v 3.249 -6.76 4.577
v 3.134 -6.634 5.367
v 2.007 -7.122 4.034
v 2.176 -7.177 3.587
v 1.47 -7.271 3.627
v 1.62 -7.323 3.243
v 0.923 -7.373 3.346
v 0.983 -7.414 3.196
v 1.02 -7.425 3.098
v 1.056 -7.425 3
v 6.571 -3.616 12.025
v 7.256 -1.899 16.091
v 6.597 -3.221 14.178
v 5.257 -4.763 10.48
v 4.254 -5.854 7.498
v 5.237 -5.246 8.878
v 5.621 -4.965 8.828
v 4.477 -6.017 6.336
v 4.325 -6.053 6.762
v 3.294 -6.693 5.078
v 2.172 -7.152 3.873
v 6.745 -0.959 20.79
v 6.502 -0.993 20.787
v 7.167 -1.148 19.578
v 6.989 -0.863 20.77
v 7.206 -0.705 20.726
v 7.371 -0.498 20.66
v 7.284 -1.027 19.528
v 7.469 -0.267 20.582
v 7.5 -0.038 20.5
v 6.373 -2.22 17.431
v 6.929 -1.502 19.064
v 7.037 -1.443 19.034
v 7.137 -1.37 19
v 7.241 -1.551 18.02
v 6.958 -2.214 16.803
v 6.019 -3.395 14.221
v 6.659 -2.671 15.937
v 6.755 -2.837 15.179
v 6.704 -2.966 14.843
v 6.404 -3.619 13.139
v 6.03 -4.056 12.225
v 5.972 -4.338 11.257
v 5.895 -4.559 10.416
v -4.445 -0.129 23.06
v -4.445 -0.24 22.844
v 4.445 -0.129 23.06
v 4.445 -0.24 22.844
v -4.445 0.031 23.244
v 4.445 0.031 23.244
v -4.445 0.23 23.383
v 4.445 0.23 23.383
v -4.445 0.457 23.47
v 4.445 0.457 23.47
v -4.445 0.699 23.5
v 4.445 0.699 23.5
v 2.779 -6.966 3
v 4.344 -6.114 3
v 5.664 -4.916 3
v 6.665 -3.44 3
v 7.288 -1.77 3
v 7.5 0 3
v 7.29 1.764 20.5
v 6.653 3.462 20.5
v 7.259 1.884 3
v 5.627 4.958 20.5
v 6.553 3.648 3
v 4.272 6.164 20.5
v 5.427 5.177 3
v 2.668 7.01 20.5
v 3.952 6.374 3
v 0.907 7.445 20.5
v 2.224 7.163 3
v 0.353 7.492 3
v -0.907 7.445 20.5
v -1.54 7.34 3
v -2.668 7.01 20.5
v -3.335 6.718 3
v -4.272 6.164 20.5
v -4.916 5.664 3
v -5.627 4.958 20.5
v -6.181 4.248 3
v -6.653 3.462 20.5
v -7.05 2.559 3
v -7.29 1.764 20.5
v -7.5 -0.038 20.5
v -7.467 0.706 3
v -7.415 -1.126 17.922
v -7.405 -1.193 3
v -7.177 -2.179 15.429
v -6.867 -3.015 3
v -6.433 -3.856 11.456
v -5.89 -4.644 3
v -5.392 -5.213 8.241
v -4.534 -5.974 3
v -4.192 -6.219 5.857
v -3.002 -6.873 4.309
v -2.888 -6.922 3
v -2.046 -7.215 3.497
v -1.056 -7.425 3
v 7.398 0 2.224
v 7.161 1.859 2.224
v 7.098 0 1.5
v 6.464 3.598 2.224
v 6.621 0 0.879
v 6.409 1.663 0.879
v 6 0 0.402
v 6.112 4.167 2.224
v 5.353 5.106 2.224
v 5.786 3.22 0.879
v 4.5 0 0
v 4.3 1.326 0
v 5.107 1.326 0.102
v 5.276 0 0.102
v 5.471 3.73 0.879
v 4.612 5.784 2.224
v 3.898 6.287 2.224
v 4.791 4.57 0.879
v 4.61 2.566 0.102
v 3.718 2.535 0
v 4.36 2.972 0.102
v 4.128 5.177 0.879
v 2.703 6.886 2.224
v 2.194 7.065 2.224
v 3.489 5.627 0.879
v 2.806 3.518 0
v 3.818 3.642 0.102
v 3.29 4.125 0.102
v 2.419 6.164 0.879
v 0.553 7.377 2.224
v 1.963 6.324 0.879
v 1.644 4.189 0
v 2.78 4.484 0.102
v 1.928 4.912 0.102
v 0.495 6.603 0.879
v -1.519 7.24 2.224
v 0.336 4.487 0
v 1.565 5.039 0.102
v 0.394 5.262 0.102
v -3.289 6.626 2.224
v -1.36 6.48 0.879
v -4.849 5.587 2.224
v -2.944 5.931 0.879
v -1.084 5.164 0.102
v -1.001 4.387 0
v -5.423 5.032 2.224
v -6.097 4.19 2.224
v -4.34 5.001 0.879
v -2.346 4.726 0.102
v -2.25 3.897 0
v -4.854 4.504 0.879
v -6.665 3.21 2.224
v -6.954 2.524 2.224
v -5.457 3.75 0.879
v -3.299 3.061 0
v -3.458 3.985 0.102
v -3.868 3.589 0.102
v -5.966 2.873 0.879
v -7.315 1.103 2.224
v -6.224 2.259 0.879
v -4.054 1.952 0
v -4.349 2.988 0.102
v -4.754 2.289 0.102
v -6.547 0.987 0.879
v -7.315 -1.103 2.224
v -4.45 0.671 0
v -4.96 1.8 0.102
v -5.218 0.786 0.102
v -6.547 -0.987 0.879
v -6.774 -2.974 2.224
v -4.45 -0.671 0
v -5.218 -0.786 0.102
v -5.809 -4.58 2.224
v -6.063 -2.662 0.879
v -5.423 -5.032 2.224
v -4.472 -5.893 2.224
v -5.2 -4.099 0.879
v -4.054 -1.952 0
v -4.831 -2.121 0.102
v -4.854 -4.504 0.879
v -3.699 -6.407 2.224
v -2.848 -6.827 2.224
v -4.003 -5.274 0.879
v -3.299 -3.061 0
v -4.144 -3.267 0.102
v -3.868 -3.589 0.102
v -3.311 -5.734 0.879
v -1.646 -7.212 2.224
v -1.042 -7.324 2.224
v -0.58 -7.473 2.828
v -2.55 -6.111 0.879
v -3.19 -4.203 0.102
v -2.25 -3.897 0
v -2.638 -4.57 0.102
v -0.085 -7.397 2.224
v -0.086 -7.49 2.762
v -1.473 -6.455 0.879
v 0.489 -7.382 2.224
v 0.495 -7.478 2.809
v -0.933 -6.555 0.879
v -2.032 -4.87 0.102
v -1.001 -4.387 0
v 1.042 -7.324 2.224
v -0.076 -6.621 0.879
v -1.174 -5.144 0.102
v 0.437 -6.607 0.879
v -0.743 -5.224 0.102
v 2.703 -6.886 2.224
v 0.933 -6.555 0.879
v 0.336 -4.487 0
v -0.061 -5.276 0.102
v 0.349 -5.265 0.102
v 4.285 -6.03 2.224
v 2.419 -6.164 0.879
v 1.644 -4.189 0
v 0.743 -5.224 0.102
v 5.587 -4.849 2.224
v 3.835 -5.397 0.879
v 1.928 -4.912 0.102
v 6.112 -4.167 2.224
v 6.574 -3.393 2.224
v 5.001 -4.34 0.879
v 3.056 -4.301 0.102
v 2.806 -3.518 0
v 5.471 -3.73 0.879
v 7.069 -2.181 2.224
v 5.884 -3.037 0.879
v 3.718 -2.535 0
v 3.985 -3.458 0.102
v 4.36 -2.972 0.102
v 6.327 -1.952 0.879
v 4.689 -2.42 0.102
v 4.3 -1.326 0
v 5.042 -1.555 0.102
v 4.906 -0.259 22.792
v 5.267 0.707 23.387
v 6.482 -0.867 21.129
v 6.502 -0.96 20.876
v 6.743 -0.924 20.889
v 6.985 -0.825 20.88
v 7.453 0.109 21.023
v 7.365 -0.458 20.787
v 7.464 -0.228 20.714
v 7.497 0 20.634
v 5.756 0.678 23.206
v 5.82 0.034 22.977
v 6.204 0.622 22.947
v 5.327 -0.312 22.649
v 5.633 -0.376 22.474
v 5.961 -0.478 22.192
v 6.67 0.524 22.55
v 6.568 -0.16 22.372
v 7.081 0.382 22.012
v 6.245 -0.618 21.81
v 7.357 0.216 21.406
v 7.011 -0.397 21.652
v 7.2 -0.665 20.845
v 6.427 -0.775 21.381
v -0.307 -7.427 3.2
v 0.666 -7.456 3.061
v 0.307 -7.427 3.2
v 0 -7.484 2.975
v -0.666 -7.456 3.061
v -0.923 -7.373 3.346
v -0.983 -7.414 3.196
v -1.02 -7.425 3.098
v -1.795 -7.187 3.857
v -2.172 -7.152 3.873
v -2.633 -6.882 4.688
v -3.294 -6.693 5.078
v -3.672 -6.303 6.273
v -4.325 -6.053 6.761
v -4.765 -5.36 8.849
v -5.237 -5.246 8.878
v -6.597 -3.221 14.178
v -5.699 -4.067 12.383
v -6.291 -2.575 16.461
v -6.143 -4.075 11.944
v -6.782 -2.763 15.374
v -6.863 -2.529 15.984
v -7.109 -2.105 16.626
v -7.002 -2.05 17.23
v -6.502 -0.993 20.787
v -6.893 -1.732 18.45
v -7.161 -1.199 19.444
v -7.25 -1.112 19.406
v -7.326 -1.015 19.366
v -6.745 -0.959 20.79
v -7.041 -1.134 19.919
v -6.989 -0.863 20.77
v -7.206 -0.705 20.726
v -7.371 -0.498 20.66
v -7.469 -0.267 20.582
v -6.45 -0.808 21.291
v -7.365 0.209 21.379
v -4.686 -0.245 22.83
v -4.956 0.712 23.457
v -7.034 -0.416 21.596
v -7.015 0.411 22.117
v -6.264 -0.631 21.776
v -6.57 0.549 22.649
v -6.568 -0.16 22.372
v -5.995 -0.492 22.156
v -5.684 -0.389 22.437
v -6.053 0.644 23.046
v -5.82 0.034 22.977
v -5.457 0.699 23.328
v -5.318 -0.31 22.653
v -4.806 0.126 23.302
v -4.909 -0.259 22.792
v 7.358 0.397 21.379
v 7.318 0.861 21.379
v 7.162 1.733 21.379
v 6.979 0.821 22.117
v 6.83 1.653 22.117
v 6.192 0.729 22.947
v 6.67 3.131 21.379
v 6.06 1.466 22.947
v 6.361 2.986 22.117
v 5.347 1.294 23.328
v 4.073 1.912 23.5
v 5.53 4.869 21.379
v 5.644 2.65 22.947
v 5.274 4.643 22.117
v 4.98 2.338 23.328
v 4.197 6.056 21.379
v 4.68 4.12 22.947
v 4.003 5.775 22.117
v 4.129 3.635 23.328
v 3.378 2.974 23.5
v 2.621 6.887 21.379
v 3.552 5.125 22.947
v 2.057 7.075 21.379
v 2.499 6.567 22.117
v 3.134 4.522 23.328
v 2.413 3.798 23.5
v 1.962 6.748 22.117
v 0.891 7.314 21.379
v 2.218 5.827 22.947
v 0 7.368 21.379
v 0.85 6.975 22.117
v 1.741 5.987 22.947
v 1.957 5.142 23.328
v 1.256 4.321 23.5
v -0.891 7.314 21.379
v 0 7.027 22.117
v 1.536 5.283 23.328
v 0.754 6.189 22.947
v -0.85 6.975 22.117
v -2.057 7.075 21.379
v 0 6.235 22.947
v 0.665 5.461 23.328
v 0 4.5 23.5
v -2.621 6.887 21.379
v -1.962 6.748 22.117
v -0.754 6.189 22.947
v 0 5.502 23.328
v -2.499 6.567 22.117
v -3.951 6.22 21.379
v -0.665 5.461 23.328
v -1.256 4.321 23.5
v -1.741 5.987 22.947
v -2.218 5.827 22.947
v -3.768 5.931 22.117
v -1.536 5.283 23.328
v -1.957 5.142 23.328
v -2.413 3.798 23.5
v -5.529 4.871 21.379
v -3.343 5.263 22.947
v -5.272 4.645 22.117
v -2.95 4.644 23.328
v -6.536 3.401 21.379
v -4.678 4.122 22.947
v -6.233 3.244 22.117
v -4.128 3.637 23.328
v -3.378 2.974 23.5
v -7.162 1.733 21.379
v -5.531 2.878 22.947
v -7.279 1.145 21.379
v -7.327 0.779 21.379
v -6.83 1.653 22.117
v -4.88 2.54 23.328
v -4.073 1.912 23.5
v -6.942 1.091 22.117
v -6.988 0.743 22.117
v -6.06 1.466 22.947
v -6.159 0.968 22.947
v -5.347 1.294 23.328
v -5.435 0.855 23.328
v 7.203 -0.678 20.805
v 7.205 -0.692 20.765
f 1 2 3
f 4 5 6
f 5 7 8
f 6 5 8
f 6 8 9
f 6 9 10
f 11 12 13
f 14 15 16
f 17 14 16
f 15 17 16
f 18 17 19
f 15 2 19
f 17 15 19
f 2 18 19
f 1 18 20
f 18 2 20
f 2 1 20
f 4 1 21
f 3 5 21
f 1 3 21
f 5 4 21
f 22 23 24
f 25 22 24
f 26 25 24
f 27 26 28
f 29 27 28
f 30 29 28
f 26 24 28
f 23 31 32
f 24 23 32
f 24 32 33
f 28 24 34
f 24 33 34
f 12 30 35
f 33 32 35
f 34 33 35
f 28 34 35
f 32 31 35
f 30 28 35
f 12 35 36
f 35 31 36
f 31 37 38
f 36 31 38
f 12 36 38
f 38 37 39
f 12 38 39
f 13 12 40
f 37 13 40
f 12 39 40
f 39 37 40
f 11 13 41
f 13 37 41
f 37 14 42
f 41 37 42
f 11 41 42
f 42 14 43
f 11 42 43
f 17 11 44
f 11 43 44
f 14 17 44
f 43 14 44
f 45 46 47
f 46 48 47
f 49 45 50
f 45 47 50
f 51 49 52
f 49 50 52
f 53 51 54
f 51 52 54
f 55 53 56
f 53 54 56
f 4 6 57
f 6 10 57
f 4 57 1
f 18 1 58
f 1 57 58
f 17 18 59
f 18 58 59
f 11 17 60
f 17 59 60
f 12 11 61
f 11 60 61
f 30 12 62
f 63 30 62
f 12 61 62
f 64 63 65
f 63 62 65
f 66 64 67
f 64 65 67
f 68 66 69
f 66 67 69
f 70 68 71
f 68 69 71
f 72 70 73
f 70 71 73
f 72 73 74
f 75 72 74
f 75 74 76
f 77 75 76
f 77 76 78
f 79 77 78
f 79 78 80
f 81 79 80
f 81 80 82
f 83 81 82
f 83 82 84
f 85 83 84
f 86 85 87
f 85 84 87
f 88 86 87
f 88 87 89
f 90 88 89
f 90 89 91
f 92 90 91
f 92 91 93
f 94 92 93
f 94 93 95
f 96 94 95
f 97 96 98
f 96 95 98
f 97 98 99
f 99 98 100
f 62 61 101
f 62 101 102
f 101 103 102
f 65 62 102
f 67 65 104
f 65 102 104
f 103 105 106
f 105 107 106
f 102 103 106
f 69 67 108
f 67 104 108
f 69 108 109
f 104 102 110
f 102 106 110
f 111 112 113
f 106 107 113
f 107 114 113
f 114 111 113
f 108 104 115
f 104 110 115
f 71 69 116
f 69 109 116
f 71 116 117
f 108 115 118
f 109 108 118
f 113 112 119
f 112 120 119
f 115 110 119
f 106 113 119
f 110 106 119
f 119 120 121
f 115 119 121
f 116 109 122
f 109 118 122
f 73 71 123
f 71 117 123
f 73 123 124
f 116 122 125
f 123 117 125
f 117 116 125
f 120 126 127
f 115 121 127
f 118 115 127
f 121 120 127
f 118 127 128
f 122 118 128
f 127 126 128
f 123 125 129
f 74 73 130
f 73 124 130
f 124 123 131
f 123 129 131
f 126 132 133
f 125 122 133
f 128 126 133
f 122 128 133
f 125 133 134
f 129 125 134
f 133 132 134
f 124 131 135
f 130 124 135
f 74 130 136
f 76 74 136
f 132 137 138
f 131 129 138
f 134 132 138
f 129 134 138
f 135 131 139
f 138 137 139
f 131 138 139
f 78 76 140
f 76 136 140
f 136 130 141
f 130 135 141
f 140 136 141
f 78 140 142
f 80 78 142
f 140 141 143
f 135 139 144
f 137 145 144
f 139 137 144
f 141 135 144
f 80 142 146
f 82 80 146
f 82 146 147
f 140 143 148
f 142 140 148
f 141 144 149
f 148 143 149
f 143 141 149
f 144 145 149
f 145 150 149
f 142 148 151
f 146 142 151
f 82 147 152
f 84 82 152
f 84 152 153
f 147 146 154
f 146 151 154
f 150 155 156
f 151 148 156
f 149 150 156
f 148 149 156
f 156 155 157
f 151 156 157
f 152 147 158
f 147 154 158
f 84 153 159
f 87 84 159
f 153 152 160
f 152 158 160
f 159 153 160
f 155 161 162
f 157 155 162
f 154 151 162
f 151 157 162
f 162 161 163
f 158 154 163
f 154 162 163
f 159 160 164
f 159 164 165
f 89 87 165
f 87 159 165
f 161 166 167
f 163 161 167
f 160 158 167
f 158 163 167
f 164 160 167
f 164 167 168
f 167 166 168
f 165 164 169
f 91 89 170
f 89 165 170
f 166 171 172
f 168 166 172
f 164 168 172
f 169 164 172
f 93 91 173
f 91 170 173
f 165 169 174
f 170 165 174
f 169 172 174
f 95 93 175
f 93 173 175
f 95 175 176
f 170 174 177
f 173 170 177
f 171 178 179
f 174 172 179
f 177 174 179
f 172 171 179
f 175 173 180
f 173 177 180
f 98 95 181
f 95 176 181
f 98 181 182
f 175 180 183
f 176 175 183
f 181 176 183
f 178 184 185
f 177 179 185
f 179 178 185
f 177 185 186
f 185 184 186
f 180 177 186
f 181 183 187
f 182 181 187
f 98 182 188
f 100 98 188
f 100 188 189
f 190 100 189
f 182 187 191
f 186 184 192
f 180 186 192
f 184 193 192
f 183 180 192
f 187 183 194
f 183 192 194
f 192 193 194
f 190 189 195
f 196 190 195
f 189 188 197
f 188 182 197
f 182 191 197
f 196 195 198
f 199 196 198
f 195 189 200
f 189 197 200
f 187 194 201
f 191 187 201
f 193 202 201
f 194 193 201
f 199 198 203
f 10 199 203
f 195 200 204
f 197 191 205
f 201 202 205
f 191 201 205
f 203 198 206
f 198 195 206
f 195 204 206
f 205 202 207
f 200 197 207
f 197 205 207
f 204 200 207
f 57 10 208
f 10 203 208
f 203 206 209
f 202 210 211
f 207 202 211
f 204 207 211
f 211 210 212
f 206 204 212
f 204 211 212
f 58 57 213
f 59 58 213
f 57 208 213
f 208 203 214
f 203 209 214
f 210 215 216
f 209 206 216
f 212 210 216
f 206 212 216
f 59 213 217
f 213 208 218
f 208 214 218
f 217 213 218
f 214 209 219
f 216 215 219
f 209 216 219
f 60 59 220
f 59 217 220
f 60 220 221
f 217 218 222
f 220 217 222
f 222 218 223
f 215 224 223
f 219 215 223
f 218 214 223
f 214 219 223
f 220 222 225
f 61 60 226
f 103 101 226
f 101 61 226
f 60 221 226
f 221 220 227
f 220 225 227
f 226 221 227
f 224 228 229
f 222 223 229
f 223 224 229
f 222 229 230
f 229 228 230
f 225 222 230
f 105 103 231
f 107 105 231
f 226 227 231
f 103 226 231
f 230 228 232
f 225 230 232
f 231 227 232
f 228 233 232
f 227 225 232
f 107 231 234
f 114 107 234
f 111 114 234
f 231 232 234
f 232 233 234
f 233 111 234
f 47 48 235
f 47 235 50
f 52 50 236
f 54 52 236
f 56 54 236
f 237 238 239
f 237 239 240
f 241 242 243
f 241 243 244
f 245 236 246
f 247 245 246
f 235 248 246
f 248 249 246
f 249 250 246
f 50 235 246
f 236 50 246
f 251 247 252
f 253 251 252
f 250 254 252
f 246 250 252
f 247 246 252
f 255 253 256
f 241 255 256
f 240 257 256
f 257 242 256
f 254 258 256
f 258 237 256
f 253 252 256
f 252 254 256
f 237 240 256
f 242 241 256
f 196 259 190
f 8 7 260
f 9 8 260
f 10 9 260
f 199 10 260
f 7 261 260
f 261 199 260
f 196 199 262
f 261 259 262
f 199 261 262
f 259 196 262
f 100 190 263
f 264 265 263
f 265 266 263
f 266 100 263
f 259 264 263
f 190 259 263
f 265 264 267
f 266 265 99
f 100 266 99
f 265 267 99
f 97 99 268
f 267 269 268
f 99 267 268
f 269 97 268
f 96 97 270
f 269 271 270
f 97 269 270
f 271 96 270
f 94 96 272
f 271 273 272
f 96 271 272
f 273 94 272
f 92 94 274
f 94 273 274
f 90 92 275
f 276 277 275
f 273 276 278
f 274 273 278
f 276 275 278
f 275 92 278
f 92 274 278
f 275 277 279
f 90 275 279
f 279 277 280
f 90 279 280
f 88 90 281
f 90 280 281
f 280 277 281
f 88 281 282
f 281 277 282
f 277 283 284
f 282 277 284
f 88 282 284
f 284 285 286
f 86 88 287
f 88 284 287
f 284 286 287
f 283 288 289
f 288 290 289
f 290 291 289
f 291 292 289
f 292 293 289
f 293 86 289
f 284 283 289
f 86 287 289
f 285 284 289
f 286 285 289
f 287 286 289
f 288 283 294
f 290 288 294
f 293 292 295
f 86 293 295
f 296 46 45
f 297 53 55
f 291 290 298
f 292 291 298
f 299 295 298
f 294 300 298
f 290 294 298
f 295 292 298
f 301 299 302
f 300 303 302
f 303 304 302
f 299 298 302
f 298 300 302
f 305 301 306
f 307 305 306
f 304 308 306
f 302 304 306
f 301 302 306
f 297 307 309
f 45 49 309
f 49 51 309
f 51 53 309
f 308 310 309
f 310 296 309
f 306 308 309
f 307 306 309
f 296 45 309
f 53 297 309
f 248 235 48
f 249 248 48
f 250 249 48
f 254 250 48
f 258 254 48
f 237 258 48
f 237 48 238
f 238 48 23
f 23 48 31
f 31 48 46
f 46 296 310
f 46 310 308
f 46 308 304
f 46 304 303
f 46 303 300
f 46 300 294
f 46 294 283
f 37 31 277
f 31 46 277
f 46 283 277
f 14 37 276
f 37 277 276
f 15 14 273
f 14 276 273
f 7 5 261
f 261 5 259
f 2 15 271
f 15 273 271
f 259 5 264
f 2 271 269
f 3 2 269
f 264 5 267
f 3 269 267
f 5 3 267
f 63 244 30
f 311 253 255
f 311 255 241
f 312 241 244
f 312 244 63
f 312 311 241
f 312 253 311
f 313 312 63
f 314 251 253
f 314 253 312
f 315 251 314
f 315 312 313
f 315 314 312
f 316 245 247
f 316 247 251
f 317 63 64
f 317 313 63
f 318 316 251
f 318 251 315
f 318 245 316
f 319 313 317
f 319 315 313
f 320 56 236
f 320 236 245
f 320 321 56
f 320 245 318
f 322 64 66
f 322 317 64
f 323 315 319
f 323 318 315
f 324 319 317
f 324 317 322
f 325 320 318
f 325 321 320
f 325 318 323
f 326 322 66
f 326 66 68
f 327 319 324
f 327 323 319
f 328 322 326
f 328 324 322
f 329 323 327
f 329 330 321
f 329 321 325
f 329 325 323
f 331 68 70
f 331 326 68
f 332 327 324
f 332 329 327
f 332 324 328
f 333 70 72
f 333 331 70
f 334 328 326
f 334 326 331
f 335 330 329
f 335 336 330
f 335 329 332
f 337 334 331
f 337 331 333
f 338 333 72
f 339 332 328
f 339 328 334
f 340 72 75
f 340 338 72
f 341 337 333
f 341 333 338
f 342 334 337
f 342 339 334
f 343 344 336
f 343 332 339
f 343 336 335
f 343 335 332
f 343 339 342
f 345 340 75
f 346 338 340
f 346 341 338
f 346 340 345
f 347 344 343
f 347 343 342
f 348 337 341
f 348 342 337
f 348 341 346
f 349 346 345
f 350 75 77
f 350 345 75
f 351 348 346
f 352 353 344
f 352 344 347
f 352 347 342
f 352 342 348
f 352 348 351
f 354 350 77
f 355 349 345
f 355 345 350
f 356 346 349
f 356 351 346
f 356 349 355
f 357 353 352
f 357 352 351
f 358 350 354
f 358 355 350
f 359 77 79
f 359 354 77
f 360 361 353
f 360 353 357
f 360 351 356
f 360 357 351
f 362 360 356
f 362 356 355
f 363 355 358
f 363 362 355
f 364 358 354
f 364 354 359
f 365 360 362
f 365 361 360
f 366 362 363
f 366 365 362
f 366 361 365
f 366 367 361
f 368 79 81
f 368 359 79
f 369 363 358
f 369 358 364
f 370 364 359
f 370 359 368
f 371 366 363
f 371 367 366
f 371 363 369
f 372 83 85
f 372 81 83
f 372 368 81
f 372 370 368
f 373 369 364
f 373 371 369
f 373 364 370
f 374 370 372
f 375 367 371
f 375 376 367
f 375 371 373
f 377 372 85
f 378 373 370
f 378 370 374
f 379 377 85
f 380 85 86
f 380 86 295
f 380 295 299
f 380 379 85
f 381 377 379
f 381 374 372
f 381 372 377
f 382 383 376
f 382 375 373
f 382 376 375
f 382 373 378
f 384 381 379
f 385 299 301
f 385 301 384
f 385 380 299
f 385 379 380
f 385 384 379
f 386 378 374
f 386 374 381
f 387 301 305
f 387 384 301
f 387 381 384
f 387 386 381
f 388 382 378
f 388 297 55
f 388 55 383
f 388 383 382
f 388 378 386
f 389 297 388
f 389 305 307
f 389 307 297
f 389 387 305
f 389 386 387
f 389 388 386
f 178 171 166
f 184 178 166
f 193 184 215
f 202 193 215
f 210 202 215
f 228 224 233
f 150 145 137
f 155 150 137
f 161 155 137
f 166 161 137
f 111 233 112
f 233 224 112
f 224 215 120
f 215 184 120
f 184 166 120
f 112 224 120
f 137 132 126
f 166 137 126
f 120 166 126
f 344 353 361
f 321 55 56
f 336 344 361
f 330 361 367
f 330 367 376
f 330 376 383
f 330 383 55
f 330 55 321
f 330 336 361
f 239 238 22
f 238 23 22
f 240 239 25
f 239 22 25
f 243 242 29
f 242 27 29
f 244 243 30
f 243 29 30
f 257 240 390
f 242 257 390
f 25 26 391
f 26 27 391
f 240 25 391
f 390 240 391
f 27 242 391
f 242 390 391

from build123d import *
from build123d.topology import SkipClean

# Parameters (mm, degrees)
SKETCH2_R               = 7.5
BOSS_EXTRUDE1_DEPTH     = 23.5
FILLET1_R               = 3
CUT_EXTRUDE1_DEPTH      = 10
CUT_EXTRUDE1_DEPTH_BACK = 10
FILLET2_R               = 1


with BuildPart() as part:
    # Sketch2 → Boss-Extrude1 (new body)
    with BuildSketch(Plane.XY):
        Circle(SKETCH2_R)
    extrude(amount=BOSS_EXTRUDE1_DEPTH)

    # Fillet1
    fillet1_edges = [part.edges().sort_by_distance(p)[0] for p in [
        (-7.5, 0, 0),
        (-7.5, 0, 23.5),
    ]]
    fillet(fillet1_edges, radius=FILLET1_R)

    # Sketch3 → Cut-Extrude1 (cut, two sides: drawn at the far end of the back side and taken through both)
    with SkipClean():  # the faces are left unmerged after this step: merging them gives an invalid solid
        with BuildSketch(Plane(origin=(0, 0, 0), x_dir=(0, 0, -1), z_dir=(1, 0, 0)).offset(-CUT_EXTRUDE1_DEPTH_BACK)):
            Polygon((-23.5, 0), (-3, -7.5), (-3, -10.4048104), (-23.5, -10.4048104), align=None)
        extrude(amount=CUT_EXTRUDE1_DEPTH + CUT_EXTRUDE1_DEPTH_BACK, mode=Mode.SUBTRACT)

    # Fillet2
    fillet2_edges = [part.edges().sort_by_distance(p)[0] for p in [
        (0, 0, 23.5),
        (5.846040718, -4.698277123, 10.658042531),
        (6.641924558, -0.332189691, 22.592014844),
        (-6.641924558, -0.332189691, 22.592014844),
        (-5.846040728, -4.69827711, 10.658042566),
    ]]
    fillet(fillet2_edges, radius=FILLET2_R)


solid = part.part
